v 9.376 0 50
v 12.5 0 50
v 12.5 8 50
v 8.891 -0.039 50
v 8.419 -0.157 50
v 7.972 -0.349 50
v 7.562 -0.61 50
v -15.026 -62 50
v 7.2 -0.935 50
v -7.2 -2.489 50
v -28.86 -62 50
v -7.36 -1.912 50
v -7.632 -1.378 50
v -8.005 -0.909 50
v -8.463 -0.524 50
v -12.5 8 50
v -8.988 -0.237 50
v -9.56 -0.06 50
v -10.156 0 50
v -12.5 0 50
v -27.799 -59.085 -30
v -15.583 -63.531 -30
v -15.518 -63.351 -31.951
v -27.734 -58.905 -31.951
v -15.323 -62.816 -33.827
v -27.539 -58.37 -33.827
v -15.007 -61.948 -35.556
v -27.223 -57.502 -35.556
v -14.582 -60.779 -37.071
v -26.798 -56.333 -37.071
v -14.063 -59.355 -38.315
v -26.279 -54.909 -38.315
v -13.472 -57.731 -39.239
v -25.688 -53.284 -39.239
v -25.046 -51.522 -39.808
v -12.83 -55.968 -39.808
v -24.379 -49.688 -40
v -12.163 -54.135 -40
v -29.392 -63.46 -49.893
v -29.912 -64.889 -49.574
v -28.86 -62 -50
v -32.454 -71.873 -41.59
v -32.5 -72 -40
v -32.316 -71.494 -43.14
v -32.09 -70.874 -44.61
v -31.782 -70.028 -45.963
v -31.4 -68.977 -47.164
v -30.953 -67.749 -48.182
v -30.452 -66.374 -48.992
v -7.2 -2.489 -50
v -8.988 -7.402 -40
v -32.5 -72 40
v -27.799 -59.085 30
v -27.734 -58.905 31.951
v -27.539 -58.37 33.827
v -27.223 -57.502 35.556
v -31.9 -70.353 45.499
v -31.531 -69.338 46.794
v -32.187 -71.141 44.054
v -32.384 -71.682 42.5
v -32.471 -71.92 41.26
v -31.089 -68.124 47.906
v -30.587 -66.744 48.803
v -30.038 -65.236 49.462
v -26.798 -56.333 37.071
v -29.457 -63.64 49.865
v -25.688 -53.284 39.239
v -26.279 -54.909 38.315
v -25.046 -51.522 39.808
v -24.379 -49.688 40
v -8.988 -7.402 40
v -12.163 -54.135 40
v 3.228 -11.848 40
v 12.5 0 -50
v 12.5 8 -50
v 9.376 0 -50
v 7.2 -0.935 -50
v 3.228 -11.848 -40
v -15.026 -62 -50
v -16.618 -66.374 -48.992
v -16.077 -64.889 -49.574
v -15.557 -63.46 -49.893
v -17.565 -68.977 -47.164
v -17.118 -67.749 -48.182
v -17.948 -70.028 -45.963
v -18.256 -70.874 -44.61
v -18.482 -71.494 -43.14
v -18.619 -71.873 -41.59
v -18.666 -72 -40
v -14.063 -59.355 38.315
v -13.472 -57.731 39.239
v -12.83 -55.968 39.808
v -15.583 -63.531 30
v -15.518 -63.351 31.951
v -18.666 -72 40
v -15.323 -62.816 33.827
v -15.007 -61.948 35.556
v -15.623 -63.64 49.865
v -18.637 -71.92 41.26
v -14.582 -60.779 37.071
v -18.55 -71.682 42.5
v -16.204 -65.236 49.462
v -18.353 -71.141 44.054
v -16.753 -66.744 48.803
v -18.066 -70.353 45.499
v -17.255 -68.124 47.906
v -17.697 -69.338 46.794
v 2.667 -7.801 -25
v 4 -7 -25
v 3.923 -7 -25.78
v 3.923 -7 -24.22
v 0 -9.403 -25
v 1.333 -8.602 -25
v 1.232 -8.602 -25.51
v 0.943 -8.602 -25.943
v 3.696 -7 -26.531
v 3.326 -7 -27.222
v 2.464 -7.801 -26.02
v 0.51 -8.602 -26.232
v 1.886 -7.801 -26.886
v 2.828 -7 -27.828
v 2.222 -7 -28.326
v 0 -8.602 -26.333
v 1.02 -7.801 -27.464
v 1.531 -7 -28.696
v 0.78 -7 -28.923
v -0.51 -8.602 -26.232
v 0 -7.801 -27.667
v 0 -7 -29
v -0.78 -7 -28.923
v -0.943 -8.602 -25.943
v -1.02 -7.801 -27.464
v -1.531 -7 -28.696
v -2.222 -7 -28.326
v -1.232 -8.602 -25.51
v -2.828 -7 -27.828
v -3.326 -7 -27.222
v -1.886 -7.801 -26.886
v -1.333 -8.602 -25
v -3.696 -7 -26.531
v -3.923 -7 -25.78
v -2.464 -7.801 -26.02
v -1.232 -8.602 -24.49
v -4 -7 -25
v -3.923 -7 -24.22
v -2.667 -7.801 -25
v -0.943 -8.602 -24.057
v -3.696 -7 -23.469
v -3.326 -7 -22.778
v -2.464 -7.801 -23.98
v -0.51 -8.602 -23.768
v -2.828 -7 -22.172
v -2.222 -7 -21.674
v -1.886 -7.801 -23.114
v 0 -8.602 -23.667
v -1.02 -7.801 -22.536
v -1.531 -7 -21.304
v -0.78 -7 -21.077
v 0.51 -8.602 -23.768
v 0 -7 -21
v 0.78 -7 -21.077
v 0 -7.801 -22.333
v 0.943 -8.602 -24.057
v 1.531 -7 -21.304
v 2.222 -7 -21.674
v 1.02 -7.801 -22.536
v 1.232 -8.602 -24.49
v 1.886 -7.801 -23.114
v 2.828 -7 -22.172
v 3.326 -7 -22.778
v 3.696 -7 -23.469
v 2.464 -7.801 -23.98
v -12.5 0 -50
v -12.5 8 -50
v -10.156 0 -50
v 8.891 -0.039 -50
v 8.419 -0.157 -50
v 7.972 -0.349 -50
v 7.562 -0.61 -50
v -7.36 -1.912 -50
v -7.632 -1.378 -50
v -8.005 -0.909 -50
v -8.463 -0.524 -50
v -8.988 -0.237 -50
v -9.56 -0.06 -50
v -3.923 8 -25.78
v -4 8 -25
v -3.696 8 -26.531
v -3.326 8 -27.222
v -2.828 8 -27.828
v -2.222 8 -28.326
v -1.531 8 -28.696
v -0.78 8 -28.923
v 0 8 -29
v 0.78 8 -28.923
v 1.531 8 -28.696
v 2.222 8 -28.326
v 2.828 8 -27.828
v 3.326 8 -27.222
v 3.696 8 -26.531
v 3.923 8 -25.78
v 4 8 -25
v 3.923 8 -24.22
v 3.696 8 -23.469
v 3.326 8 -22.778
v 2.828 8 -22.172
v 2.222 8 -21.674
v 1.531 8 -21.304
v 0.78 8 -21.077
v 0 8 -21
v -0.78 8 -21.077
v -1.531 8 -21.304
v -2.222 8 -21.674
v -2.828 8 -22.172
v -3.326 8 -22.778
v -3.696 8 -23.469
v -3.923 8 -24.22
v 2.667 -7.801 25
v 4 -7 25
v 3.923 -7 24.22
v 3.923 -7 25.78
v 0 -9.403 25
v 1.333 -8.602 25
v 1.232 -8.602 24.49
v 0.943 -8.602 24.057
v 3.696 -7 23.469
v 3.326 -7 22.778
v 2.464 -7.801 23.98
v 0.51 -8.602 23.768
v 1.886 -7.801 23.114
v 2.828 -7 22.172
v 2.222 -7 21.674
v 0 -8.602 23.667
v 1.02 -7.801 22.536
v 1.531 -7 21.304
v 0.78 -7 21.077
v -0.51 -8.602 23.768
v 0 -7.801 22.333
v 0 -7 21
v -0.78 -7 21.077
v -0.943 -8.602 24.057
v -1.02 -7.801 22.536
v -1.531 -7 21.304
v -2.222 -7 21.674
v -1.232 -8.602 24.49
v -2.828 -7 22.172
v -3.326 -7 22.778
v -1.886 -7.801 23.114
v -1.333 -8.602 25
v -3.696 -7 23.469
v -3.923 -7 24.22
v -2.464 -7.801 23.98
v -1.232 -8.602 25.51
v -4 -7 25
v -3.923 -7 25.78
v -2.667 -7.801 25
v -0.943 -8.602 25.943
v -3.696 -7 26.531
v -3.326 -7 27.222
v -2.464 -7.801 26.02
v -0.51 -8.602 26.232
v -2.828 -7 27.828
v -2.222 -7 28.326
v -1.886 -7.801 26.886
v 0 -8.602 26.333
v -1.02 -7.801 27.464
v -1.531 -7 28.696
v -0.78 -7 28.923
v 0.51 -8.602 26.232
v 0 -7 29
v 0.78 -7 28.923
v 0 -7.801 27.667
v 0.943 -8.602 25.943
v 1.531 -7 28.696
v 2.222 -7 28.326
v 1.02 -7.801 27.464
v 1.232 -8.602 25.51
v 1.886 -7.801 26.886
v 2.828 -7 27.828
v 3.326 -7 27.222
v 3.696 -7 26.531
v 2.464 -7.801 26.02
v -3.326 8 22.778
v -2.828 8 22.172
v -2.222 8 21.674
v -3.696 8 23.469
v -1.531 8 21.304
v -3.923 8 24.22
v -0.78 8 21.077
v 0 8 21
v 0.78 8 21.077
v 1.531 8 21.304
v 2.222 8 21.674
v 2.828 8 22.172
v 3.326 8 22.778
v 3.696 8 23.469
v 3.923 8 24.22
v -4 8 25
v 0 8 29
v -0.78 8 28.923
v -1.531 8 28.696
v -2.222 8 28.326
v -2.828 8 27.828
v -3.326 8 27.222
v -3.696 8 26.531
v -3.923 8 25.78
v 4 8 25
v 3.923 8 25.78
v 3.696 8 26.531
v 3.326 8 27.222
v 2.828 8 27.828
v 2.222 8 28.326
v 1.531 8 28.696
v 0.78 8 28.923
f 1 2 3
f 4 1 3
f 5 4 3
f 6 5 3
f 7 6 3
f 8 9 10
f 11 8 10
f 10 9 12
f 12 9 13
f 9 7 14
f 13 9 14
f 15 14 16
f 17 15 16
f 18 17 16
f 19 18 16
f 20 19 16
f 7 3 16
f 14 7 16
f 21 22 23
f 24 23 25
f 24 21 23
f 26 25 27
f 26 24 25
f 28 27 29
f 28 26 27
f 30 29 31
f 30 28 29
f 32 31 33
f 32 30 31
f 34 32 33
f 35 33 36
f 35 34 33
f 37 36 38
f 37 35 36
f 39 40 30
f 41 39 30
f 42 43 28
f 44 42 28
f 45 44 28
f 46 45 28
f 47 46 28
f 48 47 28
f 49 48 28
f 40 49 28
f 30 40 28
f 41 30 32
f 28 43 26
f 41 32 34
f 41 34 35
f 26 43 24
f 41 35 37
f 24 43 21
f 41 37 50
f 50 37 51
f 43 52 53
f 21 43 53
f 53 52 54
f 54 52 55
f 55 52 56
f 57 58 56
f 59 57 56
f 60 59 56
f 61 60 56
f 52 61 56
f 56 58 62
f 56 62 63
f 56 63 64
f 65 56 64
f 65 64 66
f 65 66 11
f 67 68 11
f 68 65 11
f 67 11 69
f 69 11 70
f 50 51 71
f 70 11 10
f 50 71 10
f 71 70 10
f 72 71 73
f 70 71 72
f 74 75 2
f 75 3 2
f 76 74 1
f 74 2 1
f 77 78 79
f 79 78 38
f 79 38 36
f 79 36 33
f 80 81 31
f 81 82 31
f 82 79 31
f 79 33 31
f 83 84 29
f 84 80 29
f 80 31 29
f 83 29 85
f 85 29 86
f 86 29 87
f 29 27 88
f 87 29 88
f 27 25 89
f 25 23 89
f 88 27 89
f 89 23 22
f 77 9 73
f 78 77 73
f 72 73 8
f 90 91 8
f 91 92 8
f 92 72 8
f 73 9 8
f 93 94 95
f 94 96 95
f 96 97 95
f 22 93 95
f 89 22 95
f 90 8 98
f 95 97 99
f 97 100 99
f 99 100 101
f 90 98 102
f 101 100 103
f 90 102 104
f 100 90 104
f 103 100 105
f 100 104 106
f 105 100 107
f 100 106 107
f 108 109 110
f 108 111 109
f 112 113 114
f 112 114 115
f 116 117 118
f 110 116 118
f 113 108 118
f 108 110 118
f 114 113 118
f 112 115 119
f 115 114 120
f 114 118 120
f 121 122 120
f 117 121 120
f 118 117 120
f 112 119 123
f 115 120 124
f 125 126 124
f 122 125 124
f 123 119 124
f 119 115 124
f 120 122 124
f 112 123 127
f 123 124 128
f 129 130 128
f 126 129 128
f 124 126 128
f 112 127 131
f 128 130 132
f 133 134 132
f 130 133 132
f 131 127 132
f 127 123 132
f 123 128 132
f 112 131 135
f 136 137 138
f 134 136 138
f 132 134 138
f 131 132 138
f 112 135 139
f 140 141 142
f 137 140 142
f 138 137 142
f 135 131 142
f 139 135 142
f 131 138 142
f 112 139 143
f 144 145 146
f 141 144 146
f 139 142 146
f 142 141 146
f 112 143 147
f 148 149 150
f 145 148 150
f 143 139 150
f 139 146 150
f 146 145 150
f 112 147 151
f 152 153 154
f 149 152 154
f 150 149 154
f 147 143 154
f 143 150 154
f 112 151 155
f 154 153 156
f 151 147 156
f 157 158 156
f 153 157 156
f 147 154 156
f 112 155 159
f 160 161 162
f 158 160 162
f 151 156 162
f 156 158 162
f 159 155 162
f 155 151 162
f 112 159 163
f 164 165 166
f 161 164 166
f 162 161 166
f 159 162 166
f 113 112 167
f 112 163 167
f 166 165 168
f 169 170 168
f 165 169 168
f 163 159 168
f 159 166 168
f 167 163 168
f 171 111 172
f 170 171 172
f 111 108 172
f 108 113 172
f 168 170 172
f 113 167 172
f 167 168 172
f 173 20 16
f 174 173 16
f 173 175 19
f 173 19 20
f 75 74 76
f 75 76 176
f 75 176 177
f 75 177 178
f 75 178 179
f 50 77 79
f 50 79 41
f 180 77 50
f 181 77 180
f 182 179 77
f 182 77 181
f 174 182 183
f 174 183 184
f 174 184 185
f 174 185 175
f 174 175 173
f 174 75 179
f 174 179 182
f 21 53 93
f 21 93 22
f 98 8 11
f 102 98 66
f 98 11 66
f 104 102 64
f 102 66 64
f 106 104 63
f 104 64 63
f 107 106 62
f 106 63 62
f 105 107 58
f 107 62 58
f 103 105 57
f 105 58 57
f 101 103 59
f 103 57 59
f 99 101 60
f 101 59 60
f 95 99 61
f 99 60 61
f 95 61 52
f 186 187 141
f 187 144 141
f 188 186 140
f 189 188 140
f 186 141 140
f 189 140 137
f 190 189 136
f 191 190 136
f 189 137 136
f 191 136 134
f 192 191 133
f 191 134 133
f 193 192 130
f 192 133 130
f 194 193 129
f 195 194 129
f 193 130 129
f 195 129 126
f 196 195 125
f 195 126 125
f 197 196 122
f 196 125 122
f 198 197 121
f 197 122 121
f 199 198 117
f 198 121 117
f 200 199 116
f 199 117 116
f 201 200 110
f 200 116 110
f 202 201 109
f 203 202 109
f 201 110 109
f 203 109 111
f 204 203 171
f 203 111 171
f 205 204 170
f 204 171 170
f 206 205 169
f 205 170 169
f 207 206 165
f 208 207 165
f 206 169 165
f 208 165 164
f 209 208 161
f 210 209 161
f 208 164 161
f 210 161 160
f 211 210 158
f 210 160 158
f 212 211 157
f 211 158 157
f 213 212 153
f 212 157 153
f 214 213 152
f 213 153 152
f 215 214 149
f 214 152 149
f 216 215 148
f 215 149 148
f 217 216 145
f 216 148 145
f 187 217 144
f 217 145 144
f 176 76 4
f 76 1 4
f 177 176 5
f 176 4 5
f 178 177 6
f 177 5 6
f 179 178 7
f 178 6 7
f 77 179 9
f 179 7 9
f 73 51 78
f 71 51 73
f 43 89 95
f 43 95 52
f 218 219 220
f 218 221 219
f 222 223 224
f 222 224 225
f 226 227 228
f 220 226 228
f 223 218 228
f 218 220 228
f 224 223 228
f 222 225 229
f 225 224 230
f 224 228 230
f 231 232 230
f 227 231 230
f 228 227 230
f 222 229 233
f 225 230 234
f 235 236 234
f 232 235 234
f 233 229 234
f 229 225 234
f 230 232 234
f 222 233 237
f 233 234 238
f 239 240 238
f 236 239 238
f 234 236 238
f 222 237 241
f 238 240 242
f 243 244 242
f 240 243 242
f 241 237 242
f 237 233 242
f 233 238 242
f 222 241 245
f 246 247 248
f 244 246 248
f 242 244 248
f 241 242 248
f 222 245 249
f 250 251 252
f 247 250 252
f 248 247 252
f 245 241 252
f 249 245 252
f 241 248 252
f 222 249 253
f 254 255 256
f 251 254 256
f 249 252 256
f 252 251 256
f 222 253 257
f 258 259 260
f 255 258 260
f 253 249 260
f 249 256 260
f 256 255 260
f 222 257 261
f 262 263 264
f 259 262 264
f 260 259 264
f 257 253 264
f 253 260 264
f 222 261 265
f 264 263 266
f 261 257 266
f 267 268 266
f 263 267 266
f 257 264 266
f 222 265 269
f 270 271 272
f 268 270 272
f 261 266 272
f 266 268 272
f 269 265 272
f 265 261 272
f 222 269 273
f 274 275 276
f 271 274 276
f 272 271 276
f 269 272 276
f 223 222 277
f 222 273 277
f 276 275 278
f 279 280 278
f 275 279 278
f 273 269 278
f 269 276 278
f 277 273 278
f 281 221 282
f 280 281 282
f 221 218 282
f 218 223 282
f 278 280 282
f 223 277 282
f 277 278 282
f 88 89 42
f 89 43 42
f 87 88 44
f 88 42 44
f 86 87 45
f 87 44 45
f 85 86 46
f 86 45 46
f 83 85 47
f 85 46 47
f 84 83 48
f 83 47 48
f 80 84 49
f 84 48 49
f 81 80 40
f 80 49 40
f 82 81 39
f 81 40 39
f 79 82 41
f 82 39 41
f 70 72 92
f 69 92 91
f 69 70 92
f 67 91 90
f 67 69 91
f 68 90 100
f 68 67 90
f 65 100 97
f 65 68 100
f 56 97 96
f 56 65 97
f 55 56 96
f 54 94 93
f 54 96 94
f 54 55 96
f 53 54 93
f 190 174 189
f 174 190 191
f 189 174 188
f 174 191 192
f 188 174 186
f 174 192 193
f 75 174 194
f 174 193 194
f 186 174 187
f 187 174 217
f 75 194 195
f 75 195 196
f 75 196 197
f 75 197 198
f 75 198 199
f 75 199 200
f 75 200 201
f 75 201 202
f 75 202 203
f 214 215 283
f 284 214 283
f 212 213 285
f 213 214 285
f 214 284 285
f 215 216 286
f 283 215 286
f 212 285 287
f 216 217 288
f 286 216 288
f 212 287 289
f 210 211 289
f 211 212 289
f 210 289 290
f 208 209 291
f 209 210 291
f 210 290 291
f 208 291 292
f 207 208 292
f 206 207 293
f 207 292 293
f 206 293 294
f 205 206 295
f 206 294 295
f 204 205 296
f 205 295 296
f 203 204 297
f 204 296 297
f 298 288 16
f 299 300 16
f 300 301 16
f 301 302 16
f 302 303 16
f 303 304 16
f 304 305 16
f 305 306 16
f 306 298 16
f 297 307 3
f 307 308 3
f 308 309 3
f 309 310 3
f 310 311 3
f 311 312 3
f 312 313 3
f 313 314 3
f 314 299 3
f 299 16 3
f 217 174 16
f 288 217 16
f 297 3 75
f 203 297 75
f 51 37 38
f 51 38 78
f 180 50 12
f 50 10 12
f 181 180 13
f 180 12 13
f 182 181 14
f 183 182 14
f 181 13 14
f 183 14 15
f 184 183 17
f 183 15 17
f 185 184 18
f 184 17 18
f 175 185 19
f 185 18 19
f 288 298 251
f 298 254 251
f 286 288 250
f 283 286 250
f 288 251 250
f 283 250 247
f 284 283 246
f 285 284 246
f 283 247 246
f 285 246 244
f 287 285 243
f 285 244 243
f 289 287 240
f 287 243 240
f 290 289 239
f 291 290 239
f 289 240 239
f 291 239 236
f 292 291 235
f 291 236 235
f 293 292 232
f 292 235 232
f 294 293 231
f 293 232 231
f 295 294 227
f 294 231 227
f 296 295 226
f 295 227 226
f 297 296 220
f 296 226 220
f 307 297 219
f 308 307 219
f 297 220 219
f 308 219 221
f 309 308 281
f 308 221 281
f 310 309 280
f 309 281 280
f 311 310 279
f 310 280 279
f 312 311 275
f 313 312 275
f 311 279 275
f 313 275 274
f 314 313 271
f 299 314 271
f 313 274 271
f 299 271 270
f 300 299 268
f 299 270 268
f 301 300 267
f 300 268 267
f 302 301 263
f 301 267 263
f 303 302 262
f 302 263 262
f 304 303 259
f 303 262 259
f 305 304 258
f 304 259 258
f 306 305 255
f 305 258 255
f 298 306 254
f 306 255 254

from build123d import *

# Parameters (mm, degrees)
BOSS_EXTRUDE1_DEPTH       = 50
BOSS_EXTRUDE1_DEPTH_BACK  = 50
FILLET1_R                 = 10
CUT_EXTRUDE2_DEPTH        = 50
F_1_0MM_DOWEL_HOLE1_D     = 8
F_1_0MM_DOWEL_HOLE1_DEPTH = 15
F_1_0MM_DOWEL_HOLE1_TIP   = 2.403442476


with BuildPart() as part:
    # Sketch1 → Boss-Extrude1 (new body, two sides)
    with BuildSketch(Plane.XY) as boss_extrude1_sk:
        with BuildLine():
            Line((-12.5, 8), (12.5, 8))
            Line((12.5, 8), (12.5, 0))
            Line((12.5, 0), (9.375807417, 0))
            ThreePointArc((9.375807417, 0), (8.191786524, -0.243535865), (7.2, -0.93460365))
            Line((7.2, -0.93460365), (-18.665688958, -72))
            Line((-18.665688958, -72), (-32.5, -72))
            Line((-32.5, -72), (-7.2, -2.488821288))
            ThreePointArc((-7.2, -2.488821288), (-8.223971278, -0.705055977), (-10.156128604, 0))
            Line((-10.156128604, 0), (-12.5, 0))
            Line((-12.5, 0), (-12.5, 8))
        make_face()
    extrude(amount=BOSS_EXTRUDE1_DEPTH)
    extrude(boss_extrude1_sk.sketch, amount=-BOSS_EXTRUDE1_DEPTH_BACK)

    # Fillet1
    fillet1_edges = [part.edges().sort_by_distance(p)[0] for p in [
        (-25.582844479, -72, -50),
        (-25.582844479, -72, 50),
    ]]
    fillet(fillet1_edges, radius=FILLET1_R)

    # Sketch2 → Cut-Extrude2 (cut)
    with BuildSketch(Plane(origin=(-5.557868252, 2.02289861, 0), x_dir=(0, 0, 1), z_dir=(-0.939692621, 0.342020143, 0))):
        with BuildLine():
            Line((-40, -10.029869223), (40, -10.029869223))
            Line((40, -10.029869223), (40, -55.029869223))
            ThreePointArc((40, -55.029869223), (37.071067812, -62.100937034), (30, -65.029869223))
            Line((30, -65.029869223), (-30, -65.029869223))
            ThreePointArc((-30, -65.029869223), (-37.071067812, -62.100937034), (-40, -55.029869223))
            Line((-40, -55.029869223), (-40, -10.029869223))
        make_face()
    extrude(amount=-CUT_EXTRUDE2_DEPTH, mode=Mode.SUBTRACT)

    # 1.0mm Dowel Hole1
    with Locations(Plane(origin=(0, 8, 0), x_dir=(1, 0, 0), z_dir=(0, 1, 0))):
        with Locations((0, 25), (0, -25)):
            Hole(F_1_0MM_DOWEL_HOLE1_D / 2, depth=F_1_0MM_DOWEL_HOLE1_DEPTH)
            with Locations((0, 0, -(F_1_0MM_DOWEL_HOLE1_DEPTH + F_1_0MM_DOWEL_HOLE1_TIP / 2))):  # 118° drill point
                Cone(0, F_1_0MM_DOWEL_HOLE1_D / 2, F_1_0MM_DOWEL_HOLE1_TIP, mode=Mode.SUBTRACT)


solid = part.part
